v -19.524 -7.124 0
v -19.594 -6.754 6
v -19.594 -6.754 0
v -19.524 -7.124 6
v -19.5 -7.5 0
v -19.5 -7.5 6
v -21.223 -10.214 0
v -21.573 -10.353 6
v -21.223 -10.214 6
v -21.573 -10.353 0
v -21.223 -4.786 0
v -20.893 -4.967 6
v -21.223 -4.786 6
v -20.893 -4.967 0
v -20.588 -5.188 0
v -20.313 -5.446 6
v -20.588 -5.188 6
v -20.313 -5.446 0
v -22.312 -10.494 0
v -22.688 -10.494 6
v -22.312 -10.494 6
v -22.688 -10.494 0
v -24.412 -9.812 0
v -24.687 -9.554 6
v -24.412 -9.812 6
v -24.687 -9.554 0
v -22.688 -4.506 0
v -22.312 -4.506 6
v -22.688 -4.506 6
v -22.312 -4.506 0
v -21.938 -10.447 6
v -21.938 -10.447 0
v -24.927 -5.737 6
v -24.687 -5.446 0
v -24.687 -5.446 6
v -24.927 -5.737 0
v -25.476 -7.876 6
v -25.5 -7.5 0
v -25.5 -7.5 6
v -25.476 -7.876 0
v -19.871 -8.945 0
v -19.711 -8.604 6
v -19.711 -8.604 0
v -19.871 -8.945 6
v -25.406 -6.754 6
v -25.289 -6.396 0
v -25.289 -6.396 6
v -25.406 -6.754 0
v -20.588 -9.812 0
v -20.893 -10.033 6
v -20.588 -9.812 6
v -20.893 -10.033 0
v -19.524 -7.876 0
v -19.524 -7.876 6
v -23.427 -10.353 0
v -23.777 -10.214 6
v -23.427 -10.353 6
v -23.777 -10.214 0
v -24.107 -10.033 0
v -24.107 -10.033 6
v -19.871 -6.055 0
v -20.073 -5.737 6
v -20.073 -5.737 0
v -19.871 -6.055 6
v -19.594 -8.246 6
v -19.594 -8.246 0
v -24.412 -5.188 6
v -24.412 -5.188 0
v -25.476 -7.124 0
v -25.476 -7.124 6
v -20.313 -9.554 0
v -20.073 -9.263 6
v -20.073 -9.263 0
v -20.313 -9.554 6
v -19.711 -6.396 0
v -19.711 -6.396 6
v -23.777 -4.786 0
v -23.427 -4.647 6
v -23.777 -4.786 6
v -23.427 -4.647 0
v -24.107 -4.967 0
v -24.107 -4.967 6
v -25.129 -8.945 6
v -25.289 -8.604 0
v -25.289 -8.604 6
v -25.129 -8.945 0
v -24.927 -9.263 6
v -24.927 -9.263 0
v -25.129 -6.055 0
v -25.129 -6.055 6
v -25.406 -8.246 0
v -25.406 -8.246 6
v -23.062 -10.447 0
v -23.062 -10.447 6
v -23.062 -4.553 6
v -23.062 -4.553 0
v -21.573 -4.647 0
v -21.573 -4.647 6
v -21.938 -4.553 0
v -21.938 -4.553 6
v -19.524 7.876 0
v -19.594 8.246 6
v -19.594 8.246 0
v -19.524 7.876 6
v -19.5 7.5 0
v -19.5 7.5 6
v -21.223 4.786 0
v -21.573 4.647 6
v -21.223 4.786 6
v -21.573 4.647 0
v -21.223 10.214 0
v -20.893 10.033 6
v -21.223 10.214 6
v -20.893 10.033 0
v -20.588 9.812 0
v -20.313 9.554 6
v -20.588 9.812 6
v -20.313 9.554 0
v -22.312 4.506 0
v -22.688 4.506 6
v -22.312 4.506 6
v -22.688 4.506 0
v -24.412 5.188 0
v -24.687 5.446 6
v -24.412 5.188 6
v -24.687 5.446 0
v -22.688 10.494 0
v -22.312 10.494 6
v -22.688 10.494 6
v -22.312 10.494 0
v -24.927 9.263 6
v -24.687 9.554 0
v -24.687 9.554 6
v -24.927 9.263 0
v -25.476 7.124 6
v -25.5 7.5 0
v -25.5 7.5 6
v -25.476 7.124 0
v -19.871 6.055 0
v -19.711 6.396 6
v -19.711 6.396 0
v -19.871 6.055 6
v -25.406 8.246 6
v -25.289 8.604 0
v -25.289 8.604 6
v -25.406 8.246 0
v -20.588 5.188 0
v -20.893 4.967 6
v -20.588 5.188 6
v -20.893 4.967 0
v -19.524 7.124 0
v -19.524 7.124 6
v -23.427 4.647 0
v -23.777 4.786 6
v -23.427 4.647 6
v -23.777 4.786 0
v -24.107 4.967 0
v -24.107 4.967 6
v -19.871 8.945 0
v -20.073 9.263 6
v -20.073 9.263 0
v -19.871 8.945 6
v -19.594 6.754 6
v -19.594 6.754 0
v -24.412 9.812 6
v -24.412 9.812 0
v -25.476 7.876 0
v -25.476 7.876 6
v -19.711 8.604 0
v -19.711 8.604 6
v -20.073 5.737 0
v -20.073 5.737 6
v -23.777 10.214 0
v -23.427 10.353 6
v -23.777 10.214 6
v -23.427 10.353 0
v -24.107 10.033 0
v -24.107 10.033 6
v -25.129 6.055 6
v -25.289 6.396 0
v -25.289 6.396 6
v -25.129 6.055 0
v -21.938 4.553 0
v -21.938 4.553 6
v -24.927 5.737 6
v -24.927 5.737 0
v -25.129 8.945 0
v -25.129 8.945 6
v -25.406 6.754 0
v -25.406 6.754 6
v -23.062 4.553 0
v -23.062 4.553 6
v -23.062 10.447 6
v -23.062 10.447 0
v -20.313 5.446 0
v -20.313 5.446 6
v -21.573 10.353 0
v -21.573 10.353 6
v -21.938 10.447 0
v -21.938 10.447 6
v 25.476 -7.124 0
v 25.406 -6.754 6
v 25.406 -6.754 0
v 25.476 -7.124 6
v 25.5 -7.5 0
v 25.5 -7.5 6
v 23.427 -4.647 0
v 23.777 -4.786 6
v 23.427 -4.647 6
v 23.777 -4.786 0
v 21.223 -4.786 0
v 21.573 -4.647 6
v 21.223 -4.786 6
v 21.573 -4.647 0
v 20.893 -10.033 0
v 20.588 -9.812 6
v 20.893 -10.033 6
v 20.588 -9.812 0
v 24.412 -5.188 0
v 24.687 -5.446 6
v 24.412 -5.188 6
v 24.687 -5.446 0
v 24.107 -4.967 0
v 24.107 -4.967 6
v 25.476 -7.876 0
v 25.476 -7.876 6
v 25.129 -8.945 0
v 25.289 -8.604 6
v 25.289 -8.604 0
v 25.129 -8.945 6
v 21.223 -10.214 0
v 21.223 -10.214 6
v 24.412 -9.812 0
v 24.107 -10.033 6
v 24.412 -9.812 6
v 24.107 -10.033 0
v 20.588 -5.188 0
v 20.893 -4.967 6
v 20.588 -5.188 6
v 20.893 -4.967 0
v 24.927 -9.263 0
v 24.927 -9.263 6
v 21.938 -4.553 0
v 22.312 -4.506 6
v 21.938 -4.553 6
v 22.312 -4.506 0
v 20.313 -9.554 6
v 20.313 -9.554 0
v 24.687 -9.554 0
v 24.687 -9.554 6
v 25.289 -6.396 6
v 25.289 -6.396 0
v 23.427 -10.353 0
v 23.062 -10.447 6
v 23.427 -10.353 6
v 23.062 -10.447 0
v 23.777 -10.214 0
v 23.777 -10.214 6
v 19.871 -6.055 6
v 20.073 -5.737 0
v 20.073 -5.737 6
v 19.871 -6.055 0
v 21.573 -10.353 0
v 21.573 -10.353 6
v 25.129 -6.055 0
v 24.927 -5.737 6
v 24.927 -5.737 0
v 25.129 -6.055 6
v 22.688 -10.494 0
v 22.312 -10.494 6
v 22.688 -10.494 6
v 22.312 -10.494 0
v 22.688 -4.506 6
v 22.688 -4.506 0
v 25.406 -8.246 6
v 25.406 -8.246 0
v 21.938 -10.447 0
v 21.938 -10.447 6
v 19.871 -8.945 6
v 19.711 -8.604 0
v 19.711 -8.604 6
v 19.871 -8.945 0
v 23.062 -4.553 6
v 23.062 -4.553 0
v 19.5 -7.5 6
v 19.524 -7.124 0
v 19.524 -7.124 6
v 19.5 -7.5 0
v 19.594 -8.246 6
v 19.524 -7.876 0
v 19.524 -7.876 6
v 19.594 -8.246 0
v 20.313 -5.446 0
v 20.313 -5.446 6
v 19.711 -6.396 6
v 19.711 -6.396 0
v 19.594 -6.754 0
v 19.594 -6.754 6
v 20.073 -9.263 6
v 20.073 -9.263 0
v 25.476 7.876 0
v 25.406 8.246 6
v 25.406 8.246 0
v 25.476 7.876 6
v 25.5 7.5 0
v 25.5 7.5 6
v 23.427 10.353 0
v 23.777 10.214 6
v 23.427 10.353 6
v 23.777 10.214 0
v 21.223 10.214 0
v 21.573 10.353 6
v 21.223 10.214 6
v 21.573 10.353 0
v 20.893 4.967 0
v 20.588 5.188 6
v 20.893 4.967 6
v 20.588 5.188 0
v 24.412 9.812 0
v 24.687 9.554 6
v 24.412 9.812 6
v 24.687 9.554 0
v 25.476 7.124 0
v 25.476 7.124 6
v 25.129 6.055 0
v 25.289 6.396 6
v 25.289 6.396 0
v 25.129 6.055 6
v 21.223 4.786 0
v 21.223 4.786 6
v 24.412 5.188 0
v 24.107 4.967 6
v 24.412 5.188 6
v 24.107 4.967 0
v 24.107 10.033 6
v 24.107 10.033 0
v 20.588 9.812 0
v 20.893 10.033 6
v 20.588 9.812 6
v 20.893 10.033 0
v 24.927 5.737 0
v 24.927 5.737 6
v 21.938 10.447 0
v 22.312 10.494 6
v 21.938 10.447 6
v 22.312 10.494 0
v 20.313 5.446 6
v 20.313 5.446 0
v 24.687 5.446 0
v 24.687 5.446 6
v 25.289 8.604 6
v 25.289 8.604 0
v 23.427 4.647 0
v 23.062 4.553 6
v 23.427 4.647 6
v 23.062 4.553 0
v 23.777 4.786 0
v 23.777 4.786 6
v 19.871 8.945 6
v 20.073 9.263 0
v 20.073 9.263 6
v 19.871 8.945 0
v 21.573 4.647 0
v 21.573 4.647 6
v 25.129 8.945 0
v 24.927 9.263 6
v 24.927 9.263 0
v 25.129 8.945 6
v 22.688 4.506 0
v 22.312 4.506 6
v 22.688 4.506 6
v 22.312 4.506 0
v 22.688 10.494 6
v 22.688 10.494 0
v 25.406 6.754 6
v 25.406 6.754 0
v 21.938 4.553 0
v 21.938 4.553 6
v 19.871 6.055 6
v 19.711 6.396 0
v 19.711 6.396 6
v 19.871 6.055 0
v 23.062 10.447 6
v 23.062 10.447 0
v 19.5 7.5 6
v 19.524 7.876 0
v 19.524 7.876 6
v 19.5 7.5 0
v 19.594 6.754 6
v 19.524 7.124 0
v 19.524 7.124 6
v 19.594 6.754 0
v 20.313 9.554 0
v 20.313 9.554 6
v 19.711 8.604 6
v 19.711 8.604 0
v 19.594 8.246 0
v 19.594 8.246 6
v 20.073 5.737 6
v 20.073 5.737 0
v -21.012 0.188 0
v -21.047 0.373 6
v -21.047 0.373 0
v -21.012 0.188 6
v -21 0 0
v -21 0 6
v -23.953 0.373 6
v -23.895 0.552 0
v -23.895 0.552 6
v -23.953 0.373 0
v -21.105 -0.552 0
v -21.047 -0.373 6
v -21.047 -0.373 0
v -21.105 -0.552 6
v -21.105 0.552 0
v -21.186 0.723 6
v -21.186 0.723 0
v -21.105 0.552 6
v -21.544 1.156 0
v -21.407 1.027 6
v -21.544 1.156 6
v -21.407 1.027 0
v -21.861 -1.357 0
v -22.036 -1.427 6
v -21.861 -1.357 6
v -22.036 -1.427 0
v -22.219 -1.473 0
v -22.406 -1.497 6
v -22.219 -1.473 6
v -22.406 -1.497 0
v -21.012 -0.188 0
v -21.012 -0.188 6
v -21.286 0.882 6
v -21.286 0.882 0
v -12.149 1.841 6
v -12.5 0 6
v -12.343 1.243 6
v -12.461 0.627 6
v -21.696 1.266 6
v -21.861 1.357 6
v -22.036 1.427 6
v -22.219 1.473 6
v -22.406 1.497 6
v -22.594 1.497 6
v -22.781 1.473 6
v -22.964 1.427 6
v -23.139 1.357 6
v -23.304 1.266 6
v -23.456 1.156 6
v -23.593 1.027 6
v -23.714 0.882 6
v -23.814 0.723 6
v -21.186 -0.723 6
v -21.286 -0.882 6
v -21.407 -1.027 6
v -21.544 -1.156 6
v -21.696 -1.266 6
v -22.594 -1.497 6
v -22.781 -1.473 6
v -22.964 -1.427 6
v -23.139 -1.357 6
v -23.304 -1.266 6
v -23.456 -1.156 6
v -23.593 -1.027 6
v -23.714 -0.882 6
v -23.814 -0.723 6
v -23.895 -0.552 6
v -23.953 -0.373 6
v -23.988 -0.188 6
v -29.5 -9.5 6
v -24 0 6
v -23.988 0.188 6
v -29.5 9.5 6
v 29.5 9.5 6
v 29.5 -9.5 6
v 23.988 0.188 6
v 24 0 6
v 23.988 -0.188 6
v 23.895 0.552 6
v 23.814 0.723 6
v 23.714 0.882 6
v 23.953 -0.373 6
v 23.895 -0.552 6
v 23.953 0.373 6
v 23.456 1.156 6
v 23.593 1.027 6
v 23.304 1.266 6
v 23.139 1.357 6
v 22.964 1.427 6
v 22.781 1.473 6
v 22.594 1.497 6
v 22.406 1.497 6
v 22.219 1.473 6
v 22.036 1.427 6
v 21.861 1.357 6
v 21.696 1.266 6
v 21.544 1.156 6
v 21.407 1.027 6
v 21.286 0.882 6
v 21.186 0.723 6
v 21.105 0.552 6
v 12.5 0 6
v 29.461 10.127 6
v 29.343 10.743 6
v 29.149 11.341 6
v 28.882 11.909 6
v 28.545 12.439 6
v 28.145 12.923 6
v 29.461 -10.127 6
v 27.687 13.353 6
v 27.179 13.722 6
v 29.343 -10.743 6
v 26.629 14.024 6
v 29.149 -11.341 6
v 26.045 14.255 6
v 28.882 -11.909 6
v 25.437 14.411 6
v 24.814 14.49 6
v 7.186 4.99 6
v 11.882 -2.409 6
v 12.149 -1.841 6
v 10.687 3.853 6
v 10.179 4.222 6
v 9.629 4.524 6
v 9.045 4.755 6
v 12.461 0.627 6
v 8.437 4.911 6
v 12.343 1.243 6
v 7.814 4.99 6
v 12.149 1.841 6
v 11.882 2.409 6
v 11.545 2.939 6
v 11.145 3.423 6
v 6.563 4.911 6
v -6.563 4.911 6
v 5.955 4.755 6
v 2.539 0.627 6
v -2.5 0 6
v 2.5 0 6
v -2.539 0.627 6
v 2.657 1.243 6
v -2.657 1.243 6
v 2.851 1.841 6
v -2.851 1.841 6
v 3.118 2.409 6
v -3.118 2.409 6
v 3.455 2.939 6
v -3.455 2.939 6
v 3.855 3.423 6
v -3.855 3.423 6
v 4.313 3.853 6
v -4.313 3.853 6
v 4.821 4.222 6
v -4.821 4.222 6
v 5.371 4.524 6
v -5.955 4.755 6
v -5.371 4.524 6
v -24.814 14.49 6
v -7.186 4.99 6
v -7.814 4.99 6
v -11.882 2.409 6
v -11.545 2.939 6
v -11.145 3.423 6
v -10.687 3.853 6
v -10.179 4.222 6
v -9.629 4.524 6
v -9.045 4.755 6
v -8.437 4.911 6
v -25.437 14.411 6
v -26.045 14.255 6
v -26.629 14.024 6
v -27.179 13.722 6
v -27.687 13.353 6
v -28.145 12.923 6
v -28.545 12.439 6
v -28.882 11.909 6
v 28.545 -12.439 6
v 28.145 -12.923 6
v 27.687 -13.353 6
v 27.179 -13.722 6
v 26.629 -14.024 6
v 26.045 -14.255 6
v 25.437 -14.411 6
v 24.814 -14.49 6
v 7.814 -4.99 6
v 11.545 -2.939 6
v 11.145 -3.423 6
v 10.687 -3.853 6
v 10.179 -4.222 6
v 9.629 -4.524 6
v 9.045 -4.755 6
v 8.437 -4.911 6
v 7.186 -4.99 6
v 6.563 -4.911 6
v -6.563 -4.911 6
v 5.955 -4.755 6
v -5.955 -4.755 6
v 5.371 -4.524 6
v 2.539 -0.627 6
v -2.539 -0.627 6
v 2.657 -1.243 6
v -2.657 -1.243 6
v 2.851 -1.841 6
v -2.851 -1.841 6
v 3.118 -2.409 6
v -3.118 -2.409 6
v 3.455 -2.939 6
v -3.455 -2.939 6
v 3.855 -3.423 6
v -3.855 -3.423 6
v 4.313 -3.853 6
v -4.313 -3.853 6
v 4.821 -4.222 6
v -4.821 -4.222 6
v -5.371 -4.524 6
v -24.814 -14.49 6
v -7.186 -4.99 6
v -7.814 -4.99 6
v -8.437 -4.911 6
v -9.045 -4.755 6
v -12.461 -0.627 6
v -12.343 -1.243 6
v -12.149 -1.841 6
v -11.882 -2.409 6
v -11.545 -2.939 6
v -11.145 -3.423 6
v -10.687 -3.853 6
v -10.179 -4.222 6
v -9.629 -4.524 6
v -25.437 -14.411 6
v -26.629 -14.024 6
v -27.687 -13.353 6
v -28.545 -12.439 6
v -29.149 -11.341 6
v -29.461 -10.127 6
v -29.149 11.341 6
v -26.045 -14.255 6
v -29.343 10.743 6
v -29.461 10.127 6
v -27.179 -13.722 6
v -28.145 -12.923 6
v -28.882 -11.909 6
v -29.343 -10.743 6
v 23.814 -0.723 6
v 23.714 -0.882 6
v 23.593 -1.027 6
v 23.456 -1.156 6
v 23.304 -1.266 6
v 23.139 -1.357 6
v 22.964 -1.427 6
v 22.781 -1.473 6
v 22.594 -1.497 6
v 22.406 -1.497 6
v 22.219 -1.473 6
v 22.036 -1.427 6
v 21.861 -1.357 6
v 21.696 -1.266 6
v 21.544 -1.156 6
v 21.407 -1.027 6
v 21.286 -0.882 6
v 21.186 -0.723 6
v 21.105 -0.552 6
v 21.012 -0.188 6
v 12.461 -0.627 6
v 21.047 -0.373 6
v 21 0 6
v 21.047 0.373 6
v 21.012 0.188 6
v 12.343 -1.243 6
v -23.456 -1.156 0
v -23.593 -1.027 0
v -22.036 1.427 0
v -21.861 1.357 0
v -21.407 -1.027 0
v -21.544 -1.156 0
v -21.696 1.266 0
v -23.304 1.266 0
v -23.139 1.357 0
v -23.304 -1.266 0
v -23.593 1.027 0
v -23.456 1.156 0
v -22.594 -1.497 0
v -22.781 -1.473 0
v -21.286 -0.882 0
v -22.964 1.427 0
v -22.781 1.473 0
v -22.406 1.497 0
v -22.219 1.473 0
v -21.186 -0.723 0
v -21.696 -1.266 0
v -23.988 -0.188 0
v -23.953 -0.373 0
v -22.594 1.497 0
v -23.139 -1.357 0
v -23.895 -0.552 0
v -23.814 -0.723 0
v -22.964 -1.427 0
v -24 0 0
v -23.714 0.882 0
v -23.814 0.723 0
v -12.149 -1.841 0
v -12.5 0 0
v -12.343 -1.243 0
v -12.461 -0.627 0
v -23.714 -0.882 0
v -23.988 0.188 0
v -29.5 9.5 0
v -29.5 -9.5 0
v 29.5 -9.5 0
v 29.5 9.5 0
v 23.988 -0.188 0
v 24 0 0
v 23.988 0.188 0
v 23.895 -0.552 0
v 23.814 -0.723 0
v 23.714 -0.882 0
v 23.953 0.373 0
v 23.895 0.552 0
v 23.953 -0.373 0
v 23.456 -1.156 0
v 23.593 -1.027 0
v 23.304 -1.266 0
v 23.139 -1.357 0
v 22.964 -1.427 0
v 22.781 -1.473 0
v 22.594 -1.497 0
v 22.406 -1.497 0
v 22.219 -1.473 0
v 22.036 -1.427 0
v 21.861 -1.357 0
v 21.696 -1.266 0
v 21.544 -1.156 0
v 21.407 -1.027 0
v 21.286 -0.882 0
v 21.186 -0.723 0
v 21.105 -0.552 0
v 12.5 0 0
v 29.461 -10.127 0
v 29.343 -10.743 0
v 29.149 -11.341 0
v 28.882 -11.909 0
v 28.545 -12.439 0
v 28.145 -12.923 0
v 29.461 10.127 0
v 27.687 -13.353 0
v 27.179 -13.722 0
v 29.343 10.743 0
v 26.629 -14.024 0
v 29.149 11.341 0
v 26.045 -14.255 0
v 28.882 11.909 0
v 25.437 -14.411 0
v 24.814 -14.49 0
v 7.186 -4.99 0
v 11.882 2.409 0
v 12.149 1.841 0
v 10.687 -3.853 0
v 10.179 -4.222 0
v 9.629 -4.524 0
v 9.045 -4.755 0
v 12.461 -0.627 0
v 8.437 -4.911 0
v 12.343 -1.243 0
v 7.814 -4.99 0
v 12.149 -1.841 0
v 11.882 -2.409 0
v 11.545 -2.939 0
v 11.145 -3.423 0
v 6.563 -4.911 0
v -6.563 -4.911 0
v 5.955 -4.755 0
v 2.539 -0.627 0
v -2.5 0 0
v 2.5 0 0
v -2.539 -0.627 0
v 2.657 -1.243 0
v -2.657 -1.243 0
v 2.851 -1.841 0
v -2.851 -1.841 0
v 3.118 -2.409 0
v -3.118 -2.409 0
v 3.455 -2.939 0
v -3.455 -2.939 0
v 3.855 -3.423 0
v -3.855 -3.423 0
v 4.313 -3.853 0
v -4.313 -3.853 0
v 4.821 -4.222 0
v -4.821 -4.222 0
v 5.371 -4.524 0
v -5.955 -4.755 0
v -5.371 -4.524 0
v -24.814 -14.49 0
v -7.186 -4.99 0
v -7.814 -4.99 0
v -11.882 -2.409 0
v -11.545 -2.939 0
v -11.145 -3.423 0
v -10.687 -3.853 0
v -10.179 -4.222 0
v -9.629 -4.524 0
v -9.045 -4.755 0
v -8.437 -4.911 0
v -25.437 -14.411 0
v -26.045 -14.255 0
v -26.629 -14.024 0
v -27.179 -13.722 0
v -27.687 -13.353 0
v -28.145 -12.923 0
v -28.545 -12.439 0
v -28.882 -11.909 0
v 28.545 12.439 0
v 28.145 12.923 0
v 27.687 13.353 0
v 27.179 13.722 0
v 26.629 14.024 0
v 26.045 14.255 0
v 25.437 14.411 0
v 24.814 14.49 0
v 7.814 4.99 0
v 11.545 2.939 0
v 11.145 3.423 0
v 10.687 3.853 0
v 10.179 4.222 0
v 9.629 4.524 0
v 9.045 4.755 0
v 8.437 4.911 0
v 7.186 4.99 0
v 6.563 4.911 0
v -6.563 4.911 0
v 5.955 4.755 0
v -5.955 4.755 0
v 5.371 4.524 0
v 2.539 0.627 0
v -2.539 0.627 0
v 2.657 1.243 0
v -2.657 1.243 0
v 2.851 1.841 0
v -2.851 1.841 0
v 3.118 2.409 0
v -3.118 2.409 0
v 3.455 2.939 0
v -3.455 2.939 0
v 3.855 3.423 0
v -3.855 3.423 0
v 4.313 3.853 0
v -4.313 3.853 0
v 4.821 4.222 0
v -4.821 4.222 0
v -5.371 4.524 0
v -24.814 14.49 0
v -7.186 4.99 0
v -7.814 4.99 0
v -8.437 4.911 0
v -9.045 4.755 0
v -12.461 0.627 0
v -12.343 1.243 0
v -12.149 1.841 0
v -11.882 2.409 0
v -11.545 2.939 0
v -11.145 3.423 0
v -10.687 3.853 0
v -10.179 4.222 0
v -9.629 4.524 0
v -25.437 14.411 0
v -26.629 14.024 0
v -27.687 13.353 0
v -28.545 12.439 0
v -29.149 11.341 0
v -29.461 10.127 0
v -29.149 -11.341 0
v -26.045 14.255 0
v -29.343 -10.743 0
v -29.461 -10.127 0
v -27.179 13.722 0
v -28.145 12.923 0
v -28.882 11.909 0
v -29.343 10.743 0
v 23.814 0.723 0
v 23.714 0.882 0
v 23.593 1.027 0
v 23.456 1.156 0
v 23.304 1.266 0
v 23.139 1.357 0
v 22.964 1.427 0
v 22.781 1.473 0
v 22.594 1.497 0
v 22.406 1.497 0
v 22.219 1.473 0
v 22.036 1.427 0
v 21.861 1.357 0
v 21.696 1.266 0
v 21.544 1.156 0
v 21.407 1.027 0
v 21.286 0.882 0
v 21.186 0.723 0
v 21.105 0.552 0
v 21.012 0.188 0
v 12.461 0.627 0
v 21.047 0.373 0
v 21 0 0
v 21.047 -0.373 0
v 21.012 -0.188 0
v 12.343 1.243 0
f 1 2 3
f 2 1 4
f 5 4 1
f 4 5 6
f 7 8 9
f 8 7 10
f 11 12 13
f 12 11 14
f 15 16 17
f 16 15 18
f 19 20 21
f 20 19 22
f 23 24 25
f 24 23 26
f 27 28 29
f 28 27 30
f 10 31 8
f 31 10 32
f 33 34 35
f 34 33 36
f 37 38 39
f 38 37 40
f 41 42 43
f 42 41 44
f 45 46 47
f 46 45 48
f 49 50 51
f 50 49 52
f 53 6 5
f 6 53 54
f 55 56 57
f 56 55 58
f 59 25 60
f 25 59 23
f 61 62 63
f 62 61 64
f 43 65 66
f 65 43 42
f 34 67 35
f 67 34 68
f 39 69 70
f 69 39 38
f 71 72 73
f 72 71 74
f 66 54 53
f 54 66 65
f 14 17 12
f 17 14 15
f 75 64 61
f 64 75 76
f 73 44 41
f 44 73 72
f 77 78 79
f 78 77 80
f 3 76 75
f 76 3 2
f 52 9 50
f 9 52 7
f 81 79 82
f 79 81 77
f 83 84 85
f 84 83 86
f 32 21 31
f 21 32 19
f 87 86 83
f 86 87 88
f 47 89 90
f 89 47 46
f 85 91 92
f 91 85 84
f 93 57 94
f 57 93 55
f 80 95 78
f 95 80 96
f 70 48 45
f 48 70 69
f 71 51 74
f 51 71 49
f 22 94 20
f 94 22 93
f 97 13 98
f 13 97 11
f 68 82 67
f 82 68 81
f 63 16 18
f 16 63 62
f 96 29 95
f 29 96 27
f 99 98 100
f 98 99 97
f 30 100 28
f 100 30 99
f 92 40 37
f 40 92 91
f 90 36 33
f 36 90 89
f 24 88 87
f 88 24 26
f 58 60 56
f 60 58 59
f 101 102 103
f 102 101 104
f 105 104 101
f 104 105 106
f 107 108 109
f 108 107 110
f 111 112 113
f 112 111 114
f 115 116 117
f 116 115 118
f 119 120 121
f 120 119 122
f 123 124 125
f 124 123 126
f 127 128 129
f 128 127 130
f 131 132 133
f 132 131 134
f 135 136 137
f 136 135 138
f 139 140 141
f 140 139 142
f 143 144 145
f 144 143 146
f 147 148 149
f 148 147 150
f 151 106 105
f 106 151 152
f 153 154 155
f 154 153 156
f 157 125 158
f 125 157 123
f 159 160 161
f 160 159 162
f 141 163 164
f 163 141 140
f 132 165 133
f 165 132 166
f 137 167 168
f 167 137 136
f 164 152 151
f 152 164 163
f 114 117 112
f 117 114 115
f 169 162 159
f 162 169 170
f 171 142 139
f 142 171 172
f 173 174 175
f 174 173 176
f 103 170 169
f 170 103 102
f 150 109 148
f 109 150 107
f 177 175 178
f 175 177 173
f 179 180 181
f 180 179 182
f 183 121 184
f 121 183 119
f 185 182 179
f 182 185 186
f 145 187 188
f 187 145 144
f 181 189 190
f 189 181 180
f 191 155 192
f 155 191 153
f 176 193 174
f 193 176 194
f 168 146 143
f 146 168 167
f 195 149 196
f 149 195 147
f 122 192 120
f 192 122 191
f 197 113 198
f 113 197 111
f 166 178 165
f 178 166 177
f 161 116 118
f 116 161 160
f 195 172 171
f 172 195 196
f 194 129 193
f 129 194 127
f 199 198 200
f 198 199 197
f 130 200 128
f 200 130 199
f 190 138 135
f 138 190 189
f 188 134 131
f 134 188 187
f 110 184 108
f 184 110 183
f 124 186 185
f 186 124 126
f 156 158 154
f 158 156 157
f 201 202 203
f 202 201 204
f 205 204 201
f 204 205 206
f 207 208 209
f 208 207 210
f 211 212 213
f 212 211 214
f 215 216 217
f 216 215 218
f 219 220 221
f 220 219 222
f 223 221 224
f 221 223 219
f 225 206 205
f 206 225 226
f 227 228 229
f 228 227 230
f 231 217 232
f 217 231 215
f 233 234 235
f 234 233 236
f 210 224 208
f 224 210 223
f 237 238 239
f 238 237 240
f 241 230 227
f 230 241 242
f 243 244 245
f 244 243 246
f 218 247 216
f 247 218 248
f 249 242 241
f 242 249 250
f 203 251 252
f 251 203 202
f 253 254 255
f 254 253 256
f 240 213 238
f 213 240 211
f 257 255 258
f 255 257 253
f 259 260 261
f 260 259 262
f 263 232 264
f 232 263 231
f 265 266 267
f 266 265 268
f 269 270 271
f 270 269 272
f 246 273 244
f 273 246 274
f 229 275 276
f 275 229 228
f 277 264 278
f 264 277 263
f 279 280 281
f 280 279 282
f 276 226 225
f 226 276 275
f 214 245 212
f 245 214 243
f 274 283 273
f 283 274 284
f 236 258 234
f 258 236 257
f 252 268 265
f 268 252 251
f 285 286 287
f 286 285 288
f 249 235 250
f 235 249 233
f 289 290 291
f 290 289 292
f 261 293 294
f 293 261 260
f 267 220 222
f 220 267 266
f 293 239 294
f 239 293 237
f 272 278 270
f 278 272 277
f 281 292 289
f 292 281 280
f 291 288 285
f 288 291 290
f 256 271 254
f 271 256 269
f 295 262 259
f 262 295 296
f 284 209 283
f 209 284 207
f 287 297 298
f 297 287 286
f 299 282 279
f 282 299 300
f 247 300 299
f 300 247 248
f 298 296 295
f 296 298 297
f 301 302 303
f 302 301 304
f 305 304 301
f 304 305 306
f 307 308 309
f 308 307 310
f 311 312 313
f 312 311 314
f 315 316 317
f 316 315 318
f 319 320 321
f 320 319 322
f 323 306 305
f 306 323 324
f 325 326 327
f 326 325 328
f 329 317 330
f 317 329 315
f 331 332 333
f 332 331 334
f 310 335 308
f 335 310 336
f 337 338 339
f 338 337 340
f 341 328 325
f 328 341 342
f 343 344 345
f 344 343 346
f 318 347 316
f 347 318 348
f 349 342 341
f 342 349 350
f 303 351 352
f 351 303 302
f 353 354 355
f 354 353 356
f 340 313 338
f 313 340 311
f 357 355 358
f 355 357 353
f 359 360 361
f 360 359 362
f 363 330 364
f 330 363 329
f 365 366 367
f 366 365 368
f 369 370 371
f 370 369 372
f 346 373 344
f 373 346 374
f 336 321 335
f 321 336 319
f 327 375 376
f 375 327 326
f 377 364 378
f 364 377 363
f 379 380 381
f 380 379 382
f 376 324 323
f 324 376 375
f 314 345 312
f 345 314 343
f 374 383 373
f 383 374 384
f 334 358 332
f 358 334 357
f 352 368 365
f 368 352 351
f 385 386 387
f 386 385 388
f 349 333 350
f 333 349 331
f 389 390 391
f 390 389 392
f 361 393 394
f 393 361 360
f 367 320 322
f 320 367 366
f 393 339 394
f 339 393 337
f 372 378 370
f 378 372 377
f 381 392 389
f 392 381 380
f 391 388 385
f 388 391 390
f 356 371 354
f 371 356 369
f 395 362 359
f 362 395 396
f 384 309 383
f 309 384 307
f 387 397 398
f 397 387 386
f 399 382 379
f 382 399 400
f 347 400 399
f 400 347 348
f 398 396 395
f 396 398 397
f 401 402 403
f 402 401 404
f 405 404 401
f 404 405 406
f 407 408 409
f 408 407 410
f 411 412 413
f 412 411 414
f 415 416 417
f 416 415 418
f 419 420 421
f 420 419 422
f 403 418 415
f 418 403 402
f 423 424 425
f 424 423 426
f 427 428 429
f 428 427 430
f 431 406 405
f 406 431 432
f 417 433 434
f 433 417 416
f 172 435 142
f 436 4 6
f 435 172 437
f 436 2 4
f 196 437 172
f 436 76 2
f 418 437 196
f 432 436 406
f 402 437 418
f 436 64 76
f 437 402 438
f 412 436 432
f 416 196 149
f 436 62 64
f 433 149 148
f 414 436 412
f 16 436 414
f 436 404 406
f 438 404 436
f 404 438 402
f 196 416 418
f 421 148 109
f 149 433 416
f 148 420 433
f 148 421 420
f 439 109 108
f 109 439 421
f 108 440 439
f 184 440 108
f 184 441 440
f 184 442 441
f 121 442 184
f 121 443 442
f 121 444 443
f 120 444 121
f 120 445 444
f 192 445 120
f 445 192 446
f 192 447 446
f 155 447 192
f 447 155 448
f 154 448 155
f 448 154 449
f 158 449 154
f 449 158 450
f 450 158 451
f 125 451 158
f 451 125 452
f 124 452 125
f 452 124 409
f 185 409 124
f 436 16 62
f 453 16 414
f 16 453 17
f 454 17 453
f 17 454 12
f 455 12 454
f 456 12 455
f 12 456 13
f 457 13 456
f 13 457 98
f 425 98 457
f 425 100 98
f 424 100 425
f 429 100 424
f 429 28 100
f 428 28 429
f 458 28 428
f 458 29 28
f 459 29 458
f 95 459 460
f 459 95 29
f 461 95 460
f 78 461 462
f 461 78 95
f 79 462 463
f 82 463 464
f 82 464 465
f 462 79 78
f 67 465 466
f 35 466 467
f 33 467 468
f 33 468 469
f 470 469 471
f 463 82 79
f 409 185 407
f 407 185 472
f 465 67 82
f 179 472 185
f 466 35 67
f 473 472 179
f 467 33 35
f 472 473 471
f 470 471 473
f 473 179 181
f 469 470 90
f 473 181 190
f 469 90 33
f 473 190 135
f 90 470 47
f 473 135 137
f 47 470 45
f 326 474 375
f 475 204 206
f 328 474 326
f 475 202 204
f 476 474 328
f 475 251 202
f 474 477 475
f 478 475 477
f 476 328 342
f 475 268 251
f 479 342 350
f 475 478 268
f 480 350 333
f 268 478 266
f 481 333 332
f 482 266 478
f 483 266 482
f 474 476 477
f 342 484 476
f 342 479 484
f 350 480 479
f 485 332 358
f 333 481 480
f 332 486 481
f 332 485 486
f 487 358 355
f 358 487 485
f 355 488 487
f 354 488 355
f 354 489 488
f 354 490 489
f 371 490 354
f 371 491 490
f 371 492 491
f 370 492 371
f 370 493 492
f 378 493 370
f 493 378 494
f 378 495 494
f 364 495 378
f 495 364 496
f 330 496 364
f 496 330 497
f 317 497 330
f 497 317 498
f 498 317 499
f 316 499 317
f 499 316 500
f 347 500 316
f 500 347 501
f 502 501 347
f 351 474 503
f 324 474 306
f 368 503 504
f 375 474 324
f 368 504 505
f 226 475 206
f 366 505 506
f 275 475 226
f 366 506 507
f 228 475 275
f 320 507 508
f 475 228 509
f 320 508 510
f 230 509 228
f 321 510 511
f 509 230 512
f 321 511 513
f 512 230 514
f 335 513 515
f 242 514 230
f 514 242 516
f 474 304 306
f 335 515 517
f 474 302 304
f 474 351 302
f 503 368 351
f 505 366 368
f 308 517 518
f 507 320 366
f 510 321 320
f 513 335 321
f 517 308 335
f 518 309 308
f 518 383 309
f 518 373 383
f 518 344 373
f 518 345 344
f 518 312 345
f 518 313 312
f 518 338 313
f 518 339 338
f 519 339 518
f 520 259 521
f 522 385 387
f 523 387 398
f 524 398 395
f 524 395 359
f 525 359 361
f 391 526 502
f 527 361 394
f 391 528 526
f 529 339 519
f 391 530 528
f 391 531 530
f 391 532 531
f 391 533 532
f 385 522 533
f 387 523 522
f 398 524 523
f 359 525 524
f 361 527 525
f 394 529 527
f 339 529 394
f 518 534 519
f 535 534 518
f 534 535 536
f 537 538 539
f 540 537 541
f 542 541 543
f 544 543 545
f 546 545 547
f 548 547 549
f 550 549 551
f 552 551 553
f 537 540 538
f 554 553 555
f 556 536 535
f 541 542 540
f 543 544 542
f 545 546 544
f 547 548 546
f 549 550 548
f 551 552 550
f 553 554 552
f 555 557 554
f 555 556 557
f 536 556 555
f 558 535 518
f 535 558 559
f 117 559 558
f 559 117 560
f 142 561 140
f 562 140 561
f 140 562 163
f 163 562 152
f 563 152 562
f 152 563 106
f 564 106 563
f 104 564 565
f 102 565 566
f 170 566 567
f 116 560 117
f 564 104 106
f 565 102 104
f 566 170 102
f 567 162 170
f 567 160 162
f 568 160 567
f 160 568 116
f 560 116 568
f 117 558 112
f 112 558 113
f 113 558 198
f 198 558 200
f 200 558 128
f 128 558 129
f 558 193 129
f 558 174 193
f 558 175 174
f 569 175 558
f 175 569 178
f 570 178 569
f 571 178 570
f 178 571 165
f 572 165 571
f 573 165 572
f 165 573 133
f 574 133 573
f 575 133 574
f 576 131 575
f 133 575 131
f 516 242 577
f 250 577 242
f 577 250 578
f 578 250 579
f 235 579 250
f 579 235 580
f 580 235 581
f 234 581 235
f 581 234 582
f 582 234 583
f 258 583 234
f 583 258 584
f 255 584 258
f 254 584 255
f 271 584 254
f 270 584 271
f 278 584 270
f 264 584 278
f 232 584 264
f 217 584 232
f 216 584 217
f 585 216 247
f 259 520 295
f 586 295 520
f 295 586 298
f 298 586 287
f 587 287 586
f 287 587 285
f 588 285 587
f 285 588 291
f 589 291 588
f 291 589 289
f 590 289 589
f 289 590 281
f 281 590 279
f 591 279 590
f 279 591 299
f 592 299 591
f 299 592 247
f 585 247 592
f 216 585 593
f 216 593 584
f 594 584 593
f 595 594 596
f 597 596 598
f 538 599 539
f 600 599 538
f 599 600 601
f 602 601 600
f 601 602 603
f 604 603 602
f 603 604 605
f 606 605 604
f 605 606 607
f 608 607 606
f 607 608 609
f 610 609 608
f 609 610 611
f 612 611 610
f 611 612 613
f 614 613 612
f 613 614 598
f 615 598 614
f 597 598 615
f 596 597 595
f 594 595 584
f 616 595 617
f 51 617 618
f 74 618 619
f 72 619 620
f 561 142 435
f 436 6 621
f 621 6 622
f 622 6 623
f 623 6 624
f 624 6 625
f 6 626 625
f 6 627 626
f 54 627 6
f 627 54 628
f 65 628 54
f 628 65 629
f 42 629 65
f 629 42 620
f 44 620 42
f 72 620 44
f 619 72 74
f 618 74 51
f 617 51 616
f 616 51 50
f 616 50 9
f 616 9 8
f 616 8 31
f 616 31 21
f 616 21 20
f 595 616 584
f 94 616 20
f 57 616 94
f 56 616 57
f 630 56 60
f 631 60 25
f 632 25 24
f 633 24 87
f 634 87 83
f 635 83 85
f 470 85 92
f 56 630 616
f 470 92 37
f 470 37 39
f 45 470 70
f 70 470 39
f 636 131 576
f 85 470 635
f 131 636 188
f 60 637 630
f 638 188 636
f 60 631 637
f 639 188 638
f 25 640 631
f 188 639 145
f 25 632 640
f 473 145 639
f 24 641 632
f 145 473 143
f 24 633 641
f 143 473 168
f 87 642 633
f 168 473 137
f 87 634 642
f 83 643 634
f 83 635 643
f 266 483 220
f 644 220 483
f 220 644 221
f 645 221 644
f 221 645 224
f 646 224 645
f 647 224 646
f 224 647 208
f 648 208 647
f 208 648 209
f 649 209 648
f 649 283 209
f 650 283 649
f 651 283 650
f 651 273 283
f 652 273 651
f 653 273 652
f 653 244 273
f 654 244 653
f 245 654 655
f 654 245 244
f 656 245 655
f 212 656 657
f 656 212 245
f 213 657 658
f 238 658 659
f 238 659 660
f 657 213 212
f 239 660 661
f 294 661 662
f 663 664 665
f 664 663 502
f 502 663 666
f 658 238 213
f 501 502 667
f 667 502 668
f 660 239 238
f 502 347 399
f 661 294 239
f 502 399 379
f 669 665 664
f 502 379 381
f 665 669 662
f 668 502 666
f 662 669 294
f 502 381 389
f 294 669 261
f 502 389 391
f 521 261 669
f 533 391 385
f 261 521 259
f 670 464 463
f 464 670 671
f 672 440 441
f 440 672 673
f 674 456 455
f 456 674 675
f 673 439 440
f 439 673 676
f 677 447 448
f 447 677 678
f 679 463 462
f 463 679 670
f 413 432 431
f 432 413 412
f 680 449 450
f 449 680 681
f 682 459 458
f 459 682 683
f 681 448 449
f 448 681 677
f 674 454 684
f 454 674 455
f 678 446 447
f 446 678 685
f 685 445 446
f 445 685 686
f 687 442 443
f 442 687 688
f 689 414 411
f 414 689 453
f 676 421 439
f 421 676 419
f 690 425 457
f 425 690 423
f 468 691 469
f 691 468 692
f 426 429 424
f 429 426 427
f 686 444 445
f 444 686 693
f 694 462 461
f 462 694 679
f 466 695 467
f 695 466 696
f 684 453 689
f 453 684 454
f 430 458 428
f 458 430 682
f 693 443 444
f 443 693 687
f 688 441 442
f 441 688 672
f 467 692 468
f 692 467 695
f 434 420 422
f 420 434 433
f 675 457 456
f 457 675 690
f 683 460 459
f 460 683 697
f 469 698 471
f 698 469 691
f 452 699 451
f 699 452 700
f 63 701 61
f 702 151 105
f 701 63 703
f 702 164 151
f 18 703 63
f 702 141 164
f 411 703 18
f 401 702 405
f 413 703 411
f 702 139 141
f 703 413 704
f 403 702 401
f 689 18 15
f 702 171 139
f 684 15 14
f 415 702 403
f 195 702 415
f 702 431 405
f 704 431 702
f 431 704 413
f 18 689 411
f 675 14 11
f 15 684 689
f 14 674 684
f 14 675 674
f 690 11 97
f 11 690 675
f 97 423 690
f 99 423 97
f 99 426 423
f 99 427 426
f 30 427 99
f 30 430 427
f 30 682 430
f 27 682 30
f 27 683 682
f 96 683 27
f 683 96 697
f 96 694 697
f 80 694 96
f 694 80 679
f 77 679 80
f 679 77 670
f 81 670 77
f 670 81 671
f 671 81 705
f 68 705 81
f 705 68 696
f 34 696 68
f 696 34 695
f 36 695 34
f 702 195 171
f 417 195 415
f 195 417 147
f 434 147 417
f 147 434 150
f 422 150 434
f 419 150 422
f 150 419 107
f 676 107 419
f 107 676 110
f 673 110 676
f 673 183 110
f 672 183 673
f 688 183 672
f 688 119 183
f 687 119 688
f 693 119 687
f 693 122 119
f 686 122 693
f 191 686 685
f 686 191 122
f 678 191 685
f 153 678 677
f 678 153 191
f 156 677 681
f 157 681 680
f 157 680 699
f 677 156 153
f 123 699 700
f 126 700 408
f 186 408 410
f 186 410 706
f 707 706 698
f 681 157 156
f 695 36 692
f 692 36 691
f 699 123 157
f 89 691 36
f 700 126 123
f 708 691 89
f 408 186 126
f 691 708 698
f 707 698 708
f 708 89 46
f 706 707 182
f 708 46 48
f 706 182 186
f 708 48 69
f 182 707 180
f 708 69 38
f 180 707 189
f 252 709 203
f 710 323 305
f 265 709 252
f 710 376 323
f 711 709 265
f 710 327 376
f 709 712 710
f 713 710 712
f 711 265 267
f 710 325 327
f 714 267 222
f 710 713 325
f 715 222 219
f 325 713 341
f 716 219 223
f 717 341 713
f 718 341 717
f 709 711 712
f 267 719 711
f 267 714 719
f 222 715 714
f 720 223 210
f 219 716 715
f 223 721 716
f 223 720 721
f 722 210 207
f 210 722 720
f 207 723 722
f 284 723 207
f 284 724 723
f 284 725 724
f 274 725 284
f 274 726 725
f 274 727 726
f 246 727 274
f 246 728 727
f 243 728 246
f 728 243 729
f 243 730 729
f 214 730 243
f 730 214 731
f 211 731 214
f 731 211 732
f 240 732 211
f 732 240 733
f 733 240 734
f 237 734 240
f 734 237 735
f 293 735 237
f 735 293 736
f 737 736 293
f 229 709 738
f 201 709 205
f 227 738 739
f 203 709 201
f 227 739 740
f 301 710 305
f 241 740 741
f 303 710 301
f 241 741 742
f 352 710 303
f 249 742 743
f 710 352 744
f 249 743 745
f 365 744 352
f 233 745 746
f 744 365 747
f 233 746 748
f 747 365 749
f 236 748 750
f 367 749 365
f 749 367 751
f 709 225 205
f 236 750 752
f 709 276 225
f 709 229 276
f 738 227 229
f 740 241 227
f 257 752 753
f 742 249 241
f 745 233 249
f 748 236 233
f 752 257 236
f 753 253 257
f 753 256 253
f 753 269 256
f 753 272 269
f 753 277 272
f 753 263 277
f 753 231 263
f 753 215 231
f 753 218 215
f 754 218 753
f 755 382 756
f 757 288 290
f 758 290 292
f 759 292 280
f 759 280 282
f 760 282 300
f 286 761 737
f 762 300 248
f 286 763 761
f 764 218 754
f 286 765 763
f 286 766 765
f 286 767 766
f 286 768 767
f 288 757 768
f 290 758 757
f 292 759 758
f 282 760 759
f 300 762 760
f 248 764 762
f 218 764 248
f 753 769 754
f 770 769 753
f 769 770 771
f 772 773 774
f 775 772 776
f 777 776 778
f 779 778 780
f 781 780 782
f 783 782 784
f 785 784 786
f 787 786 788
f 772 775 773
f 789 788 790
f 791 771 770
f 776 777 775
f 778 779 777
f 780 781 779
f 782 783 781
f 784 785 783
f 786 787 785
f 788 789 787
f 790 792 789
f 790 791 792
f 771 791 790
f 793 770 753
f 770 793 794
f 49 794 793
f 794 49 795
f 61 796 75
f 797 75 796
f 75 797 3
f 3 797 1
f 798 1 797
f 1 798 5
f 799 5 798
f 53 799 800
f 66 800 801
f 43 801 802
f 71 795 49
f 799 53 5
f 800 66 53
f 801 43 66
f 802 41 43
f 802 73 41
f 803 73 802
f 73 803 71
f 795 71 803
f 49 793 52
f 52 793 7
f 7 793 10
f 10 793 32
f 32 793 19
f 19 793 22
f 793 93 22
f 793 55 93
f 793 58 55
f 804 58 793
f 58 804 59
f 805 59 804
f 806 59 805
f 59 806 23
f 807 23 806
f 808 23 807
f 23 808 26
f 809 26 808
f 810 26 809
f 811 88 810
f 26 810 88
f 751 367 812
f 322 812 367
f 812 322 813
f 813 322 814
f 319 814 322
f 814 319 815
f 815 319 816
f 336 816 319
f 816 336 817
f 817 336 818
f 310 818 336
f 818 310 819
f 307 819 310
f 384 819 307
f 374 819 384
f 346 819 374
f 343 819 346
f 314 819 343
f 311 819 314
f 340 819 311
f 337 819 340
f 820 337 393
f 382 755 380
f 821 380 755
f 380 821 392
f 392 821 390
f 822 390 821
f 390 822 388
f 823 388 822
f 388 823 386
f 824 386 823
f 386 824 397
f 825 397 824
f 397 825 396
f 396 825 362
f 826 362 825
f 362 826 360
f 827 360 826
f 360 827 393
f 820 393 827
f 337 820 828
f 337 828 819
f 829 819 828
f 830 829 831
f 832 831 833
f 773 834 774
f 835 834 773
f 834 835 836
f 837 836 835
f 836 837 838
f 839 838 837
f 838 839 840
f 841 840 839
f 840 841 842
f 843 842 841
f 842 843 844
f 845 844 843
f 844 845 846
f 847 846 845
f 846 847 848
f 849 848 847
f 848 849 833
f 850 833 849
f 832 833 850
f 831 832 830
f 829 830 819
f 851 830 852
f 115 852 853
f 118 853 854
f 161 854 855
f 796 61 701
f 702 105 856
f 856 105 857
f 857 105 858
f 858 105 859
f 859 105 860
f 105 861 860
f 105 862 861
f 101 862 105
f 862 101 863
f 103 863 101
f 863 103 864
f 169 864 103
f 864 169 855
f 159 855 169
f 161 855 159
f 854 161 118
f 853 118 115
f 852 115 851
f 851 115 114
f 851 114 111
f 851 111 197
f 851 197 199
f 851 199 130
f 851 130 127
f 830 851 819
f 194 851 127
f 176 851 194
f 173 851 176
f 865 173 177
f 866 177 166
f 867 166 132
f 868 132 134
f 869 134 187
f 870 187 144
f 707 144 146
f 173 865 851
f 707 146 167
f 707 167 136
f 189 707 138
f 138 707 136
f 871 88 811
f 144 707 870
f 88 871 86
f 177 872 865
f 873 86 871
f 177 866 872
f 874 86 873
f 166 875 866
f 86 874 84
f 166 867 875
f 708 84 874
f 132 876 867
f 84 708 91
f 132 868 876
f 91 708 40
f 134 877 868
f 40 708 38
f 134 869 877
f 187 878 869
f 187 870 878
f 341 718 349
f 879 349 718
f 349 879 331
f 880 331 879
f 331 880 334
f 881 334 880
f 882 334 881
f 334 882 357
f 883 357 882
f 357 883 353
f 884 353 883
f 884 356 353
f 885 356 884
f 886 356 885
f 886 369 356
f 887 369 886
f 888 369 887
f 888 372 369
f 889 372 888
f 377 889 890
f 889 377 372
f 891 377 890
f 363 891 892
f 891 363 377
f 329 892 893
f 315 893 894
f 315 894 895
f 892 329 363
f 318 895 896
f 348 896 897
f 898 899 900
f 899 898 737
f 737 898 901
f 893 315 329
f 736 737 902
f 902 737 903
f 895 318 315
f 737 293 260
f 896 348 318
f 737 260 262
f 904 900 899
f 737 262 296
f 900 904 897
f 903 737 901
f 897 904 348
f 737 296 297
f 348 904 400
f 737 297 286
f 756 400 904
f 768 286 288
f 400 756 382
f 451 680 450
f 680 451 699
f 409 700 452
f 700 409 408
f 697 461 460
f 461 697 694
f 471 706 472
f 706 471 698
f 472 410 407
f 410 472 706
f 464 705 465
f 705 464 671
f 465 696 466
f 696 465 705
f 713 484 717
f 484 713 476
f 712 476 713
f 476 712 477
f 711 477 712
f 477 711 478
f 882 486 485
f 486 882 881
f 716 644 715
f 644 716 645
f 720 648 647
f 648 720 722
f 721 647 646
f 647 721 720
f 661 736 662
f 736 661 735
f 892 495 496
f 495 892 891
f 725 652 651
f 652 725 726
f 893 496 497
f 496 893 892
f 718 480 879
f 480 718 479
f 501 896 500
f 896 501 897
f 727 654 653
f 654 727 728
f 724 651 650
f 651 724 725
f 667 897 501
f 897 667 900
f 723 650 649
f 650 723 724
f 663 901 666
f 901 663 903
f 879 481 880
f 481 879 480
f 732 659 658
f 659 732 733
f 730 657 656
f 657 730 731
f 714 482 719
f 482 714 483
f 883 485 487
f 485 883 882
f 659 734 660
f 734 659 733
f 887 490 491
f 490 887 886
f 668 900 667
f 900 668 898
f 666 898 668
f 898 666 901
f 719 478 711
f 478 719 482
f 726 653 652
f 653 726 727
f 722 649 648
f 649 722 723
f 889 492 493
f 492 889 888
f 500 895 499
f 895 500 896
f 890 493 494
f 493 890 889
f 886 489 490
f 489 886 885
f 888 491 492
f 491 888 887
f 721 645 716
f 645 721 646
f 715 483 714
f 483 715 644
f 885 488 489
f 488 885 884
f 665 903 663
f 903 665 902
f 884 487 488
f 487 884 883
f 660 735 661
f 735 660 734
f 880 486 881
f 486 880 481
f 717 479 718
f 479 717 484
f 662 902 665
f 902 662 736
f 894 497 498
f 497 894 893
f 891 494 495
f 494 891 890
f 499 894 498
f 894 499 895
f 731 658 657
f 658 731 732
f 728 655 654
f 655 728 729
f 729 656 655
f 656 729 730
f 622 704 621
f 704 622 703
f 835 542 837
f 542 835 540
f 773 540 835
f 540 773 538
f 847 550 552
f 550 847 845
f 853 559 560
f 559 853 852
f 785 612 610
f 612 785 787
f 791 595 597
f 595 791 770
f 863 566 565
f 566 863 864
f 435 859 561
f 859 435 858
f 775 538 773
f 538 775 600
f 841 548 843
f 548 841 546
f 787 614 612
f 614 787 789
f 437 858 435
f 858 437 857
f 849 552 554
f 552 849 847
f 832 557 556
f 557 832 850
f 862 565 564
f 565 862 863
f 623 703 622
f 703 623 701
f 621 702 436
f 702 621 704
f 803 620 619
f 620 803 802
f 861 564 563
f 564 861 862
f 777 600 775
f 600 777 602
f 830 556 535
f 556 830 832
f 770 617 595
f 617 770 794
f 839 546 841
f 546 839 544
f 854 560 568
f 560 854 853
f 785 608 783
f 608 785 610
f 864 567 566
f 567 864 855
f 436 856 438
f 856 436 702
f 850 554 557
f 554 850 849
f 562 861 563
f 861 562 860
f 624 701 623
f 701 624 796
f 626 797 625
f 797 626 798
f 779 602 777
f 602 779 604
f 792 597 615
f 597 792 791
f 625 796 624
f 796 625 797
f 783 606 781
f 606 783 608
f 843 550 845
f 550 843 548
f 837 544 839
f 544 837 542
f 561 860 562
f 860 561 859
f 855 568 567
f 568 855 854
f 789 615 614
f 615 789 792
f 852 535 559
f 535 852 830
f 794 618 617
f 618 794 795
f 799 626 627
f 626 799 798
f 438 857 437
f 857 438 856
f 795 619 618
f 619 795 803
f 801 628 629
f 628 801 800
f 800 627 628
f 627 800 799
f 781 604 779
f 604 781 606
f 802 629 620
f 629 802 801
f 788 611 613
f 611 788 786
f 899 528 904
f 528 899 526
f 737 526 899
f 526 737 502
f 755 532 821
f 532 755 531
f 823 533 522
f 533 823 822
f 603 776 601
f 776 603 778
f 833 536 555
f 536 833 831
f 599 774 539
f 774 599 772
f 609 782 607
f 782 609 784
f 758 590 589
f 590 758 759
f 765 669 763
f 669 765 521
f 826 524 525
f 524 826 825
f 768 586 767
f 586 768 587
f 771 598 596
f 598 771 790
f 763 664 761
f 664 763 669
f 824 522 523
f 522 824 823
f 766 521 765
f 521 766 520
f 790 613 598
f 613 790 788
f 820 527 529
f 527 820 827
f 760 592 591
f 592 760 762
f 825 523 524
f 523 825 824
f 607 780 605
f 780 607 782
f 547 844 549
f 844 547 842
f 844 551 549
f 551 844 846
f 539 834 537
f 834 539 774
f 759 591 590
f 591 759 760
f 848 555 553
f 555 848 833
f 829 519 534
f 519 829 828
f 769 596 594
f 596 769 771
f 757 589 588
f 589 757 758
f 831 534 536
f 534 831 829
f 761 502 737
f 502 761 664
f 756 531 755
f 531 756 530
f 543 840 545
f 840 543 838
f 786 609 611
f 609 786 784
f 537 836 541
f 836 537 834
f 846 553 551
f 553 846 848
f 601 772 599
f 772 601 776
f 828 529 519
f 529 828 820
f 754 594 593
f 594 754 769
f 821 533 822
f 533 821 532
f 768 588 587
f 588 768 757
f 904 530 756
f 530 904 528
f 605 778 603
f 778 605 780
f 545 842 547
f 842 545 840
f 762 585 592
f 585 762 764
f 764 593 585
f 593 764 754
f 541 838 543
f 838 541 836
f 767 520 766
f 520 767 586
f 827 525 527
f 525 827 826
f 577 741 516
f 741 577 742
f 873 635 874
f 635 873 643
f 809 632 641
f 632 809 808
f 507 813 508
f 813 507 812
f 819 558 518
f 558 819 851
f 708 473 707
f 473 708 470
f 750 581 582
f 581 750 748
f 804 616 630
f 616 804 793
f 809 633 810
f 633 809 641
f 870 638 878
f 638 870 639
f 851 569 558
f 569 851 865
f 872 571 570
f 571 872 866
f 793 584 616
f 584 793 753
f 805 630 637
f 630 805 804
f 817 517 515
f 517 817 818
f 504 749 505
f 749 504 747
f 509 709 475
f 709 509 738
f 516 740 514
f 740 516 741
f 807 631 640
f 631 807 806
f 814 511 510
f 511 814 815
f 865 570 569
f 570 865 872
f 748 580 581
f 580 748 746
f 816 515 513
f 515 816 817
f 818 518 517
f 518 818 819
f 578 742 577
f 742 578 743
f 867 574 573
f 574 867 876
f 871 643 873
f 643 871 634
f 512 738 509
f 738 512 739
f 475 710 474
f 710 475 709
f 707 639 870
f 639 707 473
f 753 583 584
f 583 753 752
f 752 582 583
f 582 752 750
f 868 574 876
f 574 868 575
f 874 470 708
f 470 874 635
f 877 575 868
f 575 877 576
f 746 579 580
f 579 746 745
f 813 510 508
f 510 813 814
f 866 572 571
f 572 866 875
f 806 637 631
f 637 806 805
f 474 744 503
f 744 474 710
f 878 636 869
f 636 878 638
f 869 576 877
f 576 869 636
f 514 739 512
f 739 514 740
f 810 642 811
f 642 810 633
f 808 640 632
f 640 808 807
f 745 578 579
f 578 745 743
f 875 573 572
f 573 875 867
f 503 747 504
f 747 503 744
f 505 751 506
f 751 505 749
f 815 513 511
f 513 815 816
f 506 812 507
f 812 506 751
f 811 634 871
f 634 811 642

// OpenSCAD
$fn = 50;


difference() {
	union() {
		hull() {
			translate(v = [-24.5000000000, 9.5000000000, 0]) {
				cylinder(h = 6, r = 5);
			}
			translate(v = [24.5000000000, 9.5000000000, 0]) {
				cylinder(h = 6, r = 5);
			}
			translate(v = [-24.5000000000, -9.5000000000, 0]) {
				cylinder(h = 6, r = 5);
			}
			translate(v = [24.5000000000, -9.5000000000, 0]) {
				cylinder(h = 6, r = 5);
			}
		}
	}
	union() {
		#translate(v = [-22.5000000000, -7.5000000000, 0]) {
			cylinder(h = 6, r = 3.0000000000);
		}
		#translate(v = [-22.5000000000, 7.5000000000, 0]) {
			cylinder(h = 6, r = 3.0000000000);
		}
		#translate(v = [22.5000000000, -7.5000000000, 0]) {
			cylinder(h = 6, r = 3.0000000000);
		}
		#translate(v = [22.5000000000, 7.5000000000, 0]) {
			cylinder(h = 6, r = 3.0000000000);
		}
		#translate(v = [-22.5000000000, -7.5000000000, -100.0000000000]) {
			cylinder(h = 200, r = 3.0000000000);
		}
		#translate(v = [-22.5000000000, 7.5000000000, -100.0000000000]) {
			cylinder(h = 200, r = 3.0000000000);
		}
		#translate(v = [22.5000000000, -7.5000000000, -100.0000000000]) {
			cylinder(h = 200, r = 3.0000000000);
		}
		#translate(v = [22.5000000000, 7.5000000000, -100.0000000000]) {
			cylinder(h = 200, r = 3.0000000000);
		}
		#translate(v = [-22.5000000000, -7.5000000000, 0]) {
			cylinder(h = 6, r = 1.5000000000);
		}
		#translate(v = [-22.5000000000, 0.0000000000, 0]) {
			cylinder(h = 6, r = 1.5000000000);
		}
		#translate(v = [-22.5000000000, 7.5000000000, 0]) {
			cylinder(h = 6, r = 1.5000000000);
		}
		#translate(v = [22.5000000000, -7.5000000000, 0]) {
			cylinder(h = 6, r = 1.5000000000);
		}
		#translate(v = [22.5000000000, 0.0000000000, 0]) {
			cylinder(h = 6, r = 1.5000000000);
		}
		#translate(v = [22.5000000000, 7.5000000000, 0]) {
			cylinder(h = 6, r = 1.5000000000);
		}
		#translate(v = [-22.5000000000, -7.5000000000, 0]) {
			cylinder(h = 6, r = 1.5000000000);
		}
		#translate(v = [-22.5000000000, 0.0000000000, 0]) {
			cylinder(h = 6, r = 1.5000000000);
		}
		#translate(v = [-22.5000000000, 7.5000000000, 0]) {
			cylinder(h = 6, r = 1.5000000000);
		}
		#translate(v = [22.5000000000, -7.5000000000, 0]) {
			cylinder(h = 6, r = 1.5000000000);
		}
		#translate(v = [22.5000000000, 0.0000000000, 0]) {
			cylinder(h = 6, r = 1.5000000000);
		}
		#translate(v = [22.5000000000, 7.5000000000, 0]) {
			cylinder(h = 6, r = 1.5000000000);
		}
		#translate(v = [-22.5000000000, -7.5000000000, 0]) {
			cylinder(h = 6, r = 1.5000000000);
		}
		#translate(v = [-22.5000000000, 0.0000000000, 0]) {
			cylinder(h = 6, r = 1.5000000000);
		}
		#translate(v = [-22.5000000000, 7.5000000000, 0]) {
			cylinder(h = 6, r = 1.5000000000);
		}
		#translate(v = [22.5000000000, -7.5000000000, 0]) {
			cylinder(h = 6, r = 1.5000000000);
		}
		#translate(v = [22.5000000000, 0.0000000000, 0]) {
			cylinder(h = 6, r = 1.5000000000);
		}
		#translate(v = [22.5000000000, 7.5000000000, 0]) {
			cylinder(h = 6, r = 1.5000000000);
		}
		#translate(v = [-7.5000000000, 0, 0]) {
			cylinder(h = 6, r = 5.0000000000);
		}
		#translate(v = [7.5000000000, 0, 0]) {
			cylinder(h = 6, r = 5.0000000000);
		}
	}
}
